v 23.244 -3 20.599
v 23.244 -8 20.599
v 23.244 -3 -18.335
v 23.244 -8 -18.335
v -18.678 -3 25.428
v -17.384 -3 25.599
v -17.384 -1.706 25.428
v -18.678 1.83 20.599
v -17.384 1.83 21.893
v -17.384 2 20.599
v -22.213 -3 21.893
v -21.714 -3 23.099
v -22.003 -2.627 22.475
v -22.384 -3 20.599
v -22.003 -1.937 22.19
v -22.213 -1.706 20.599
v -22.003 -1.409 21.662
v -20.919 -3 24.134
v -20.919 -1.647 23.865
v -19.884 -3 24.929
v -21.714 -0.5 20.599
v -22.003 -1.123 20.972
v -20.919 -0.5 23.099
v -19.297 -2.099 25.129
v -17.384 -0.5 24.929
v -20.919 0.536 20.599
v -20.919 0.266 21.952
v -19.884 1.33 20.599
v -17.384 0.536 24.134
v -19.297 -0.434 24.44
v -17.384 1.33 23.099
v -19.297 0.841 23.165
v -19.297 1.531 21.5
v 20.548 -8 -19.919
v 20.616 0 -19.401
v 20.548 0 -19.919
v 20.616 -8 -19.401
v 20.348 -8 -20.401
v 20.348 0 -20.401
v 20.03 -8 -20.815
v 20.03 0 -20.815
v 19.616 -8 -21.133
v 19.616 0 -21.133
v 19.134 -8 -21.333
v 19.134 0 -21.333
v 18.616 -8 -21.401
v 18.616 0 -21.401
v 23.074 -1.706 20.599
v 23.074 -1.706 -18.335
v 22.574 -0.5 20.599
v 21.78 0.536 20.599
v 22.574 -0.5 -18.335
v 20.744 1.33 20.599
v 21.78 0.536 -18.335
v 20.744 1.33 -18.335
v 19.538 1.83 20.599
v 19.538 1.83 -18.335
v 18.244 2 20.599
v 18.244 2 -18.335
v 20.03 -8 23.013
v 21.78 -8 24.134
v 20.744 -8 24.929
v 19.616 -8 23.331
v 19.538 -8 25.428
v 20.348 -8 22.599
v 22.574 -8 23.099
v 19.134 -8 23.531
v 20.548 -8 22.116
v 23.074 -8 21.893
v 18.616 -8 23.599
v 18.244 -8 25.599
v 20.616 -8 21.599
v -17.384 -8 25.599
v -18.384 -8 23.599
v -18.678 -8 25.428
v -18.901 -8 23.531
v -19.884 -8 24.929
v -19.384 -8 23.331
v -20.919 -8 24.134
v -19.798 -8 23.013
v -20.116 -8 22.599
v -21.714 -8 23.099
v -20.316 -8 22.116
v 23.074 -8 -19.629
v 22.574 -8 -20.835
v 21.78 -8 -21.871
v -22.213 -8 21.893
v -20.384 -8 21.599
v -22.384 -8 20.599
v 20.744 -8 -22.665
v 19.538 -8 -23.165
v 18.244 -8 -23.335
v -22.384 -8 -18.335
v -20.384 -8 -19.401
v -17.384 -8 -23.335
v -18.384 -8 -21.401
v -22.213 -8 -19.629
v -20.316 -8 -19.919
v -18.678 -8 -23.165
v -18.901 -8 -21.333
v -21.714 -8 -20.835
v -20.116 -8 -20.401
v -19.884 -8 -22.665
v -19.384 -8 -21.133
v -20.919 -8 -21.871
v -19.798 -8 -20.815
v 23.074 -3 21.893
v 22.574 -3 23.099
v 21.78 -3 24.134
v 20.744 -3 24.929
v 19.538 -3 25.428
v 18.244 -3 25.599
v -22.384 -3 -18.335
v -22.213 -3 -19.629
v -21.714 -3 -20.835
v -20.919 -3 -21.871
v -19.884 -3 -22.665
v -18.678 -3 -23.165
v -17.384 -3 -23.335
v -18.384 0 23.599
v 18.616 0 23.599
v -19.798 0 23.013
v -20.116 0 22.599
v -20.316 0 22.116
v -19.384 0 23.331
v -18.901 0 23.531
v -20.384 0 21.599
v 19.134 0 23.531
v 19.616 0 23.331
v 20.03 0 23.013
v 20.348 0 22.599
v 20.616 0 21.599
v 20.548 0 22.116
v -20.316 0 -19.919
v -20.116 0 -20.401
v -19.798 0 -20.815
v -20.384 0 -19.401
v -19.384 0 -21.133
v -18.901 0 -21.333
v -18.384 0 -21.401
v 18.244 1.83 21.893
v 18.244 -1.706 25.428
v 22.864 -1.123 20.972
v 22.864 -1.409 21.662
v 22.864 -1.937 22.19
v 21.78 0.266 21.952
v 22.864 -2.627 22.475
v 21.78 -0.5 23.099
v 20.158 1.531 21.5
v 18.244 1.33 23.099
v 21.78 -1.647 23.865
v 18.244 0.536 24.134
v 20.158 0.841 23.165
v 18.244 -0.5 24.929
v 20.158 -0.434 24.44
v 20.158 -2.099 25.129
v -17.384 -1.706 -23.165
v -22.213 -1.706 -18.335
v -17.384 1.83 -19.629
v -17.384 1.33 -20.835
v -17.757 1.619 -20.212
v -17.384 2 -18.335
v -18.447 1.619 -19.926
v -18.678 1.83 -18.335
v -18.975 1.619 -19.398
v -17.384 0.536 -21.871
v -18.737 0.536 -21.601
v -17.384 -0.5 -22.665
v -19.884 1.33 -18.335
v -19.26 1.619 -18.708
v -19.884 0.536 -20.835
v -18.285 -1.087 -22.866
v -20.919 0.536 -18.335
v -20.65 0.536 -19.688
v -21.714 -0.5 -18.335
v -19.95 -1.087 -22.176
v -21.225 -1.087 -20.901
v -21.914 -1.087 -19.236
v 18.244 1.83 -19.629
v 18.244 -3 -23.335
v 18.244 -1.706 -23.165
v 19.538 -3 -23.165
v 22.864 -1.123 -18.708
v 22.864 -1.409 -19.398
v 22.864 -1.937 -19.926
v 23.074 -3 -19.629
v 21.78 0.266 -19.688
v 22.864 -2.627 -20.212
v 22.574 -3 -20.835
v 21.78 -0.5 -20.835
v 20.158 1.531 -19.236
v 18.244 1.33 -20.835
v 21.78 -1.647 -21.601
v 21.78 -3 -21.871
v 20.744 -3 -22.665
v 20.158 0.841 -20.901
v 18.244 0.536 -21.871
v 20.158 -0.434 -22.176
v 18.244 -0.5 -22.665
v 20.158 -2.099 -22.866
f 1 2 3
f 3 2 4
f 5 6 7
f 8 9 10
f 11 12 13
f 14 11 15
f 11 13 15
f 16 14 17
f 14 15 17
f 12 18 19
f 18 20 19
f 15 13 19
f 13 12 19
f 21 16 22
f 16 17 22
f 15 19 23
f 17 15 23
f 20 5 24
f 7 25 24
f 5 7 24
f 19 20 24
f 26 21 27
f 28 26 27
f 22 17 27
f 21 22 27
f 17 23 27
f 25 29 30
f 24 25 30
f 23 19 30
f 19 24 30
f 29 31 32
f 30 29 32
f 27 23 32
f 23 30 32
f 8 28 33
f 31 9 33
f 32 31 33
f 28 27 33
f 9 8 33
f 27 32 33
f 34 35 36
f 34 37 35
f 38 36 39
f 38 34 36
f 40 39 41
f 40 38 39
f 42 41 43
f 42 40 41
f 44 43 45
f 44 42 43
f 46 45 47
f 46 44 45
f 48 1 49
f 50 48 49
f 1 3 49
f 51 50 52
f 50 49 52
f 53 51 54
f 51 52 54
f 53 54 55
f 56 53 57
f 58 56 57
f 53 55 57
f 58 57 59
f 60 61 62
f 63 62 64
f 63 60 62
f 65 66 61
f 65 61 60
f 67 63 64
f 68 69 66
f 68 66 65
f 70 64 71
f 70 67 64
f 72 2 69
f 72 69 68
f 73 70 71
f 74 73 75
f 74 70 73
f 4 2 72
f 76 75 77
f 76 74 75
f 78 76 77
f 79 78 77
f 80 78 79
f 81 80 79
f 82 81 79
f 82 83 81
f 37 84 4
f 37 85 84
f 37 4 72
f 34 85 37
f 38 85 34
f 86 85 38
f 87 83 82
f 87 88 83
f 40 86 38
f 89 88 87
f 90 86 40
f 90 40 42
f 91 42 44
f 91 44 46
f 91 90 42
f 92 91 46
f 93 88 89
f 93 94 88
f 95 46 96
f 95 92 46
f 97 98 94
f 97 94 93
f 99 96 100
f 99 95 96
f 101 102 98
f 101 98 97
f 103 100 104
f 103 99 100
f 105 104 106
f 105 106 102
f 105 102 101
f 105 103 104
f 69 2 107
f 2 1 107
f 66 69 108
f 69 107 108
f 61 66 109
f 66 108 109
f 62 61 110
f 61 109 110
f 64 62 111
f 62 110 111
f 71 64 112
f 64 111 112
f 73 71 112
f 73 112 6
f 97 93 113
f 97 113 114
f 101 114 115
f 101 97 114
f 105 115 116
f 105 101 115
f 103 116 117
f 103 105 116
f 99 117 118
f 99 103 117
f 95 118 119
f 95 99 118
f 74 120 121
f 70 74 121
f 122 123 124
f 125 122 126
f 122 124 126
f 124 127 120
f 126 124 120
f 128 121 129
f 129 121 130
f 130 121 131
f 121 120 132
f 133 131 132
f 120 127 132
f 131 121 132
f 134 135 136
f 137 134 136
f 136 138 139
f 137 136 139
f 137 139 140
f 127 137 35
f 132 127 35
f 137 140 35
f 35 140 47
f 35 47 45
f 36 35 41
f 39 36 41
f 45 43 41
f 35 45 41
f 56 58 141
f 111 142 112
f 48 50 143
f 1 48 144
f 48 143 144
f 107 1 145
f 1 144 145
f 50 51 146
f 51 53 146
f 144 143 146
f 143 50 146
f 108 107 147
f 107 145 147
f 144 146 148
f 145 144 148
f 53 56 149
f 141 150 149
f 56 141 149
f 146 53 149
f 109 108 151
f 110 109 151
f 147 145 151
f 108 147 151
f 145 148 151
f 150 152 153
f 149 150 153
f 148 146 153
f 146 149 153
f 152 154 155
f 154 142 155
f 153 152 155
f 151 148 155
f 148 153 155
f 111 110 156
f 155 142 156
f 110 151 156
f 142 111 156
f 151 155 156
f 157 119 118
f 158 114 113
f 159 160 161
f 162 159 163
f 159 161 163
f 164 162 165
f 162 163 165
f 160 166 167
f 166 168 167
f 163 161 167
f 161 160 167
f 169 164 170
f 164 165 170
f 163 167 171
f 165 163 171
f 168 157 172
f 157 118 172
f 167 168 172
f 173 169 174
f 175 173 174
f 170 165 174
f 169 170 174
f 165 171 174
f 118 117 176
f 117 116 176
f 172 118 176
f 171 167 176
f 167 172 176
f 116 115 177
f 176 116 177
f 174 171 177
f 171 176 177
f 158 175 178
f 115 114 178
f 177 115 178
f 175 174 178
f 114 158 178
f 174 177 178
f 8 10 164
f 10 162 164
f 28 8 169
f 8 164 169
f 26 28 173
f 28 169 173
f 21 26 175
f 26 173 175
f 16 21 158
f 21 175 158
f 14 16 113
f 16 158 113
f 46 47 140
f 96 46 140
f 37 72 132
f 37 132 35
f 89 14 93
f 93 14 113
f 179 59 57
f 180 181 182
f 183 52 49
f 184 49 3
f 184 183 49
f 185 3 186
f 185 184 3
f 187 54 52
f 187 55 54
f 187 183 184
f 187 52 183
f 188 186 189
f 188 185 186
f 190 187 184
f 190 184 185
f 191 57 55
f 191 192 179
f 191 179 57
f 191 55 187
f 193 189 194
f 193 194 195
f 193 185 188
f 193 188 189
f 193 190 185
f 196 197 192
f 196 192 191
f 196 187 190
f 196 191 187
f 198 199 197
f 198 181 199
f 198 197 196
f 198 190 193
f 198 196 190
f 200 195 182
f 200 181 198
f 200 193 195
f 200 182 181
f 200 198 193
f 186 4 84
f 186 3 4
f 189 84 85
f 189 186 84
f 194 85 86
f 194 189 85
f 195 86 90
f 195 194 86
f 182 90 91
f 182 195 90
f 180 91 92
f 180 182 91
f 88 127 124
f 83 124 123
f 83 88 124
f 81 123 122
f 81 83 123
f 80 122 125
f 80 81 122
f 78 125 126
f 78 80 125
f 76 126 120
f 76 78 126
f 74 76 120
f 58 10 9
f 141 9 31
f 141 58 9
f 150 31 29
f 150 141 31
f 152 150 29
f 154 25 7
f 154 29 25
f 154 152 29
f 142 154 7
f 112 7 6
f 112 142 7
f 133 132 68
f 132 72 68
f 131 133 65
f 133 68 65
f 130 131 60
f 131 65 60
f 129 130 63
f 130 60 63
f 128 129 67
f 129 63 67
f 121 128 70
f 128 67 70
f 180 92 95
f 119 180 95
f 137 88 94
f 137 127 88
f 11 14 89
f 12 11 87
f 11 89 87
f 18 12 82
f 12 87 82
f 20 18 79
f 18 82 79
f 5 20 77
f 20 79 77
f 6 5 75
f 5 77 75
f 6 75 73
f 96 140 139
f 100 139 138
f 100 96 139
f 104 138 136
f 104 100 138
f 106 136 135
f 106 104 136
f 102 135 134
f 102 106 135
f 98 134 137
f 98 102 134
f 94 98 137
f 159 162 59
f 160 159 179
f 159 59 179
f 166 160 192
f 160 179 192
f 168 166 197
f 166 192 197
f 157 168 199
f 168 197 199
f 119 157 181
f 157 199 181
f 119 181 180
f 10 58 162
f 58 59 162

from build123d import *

# Parameters (mm, degrees)
SKETCH1_W                = 41
SKETCH1_H                = 45
BOSS_EXTRUDE1_DEPTH      = 2
SKETCH3_W                = 41
SKETCH3_H                = 2
BOSS_EXTRUDE2_DEPTH      = 10
SKETCH9_W                = 2
SKETCH9_H                = 48.933806043
BOSS_EXTRUDE6_DEPTH      = 10
SKETCH7_W                = 41
SKETCH7_H                = 1.933806043
BOSS_EXTRUDE7_DEPTH      = 8
BOSS_EXTRUDE7_DEPTH_BACK = 2
SKETCH10_W               = 2.62804999
SKETCH10_H               = 48.933806043
BOSS_EXTRUDE8_DEPTH      = 10
FILLET3_R                = 5
FILLET4_R                = 2


with BuildPart() as part:
    # Sketch1 → Boss-Extrude1 (new body)
    with BuildSketch(Plane(origin=(0, 0, 0), x_dir=(1, 0, 0), z_dir=(0, 1, 0))):
        with Locations((0.11627907, -1.098837209)):
            Rectangle(SKETCH1_W, SKETCH1_H)
    extrude(amount=BOSS_EXTRUDE1_DEPTH)

    # Sketch3 → Boss-Extrude2 (add)
    with BuildSketch(Plane(origin=(0, 2, 0), x_dir=(1, 0, 0), z_dir=(0, 1, 0))):
        with Locations((0.11627907, -24.598837209)):
            Rectangle(SKETCH3_W, SKETCH3_H)
    extrude(amount=-BOSS_EXTRUDE2_DEPTH)

    # Sketch9 → Boss-Extrude6 (add)
    with BuildSketch(Plane(origin=(0, 2, 0), x_dir=(1, 0, 0), z_dir=(0, 1, 0))):
        with Locations((-21.38372093, -1.131934188)):
            Rectangle(SKETCH9_W, SKETCH9_H)
    extrude(amount=-BOSS_EXTRUDE6_DEPTH)

    # Sketch7 → Boss-Extrude7 (add, two sides)
    with BuildSketch(Plane(origin=(0, 0, 0), x_dir=(-1, 0, 0), z_dir=(0, -1, 0))) as boss_extrude7_sk:
        with Locations((-0.11627907, 22.368065812)):
            Rectangle(SKETCH7_W, SKETCH7_H)
    extrude(amount=BOSS_EXTRUDE7_DEPTH)
    extrude(boss_extrude7_sk.sketch, amount=-BOSS_EXTRUDE7_DEPTH_BACK)

    # Sketch10 → Boss-Extrude8 (add)
    with BuildSketch(Plane(origin=(0, -8, 0), x_dir=(-1, 0, 0), z_dir=(0, -1, 0))):
        with Locations((-21.930304065, -1.131934188)):
            Rectangle(SKETCH10_W, SKETCH10_H)
    extrude(amount=-BOSS_EXTRUDE8_DEPTH)

    # Fillet3
    fillet3_edges = [part.edges().sort_by_distance(p)[0] for p in [
        (0.430304065, 2, 25.598837209),
        (-22.38372093, -3, 25.598837209),
        (-22.38372093, -3, -23.334968834),
        (0.430304065, 2, -23.334968834),
        (-22.38372093, 2, 1.131934188),
        (23.24432906, 2, 1.131934188),
        (23.24432906, -3, 25.598837209),
        (23.24432906, -3, -23.334968834),
    ]]
    fillet(fillet3_edges, radius=FILLET3_R)

    # Fillet4
    fillet4_edges = [part.edges().sort_by_distance(p)[0] for p in [
        (-20.38372093, -4, 23.598837209),
        (20.61627907, -4, 23.598837209),
        (-20.38372093, -4, -21.401162791),
        (20.61627907, -4, -21.401162791),
    ]]
    fillet(fillet4_edges, radius=FILLET4_R)


solid = part.part
